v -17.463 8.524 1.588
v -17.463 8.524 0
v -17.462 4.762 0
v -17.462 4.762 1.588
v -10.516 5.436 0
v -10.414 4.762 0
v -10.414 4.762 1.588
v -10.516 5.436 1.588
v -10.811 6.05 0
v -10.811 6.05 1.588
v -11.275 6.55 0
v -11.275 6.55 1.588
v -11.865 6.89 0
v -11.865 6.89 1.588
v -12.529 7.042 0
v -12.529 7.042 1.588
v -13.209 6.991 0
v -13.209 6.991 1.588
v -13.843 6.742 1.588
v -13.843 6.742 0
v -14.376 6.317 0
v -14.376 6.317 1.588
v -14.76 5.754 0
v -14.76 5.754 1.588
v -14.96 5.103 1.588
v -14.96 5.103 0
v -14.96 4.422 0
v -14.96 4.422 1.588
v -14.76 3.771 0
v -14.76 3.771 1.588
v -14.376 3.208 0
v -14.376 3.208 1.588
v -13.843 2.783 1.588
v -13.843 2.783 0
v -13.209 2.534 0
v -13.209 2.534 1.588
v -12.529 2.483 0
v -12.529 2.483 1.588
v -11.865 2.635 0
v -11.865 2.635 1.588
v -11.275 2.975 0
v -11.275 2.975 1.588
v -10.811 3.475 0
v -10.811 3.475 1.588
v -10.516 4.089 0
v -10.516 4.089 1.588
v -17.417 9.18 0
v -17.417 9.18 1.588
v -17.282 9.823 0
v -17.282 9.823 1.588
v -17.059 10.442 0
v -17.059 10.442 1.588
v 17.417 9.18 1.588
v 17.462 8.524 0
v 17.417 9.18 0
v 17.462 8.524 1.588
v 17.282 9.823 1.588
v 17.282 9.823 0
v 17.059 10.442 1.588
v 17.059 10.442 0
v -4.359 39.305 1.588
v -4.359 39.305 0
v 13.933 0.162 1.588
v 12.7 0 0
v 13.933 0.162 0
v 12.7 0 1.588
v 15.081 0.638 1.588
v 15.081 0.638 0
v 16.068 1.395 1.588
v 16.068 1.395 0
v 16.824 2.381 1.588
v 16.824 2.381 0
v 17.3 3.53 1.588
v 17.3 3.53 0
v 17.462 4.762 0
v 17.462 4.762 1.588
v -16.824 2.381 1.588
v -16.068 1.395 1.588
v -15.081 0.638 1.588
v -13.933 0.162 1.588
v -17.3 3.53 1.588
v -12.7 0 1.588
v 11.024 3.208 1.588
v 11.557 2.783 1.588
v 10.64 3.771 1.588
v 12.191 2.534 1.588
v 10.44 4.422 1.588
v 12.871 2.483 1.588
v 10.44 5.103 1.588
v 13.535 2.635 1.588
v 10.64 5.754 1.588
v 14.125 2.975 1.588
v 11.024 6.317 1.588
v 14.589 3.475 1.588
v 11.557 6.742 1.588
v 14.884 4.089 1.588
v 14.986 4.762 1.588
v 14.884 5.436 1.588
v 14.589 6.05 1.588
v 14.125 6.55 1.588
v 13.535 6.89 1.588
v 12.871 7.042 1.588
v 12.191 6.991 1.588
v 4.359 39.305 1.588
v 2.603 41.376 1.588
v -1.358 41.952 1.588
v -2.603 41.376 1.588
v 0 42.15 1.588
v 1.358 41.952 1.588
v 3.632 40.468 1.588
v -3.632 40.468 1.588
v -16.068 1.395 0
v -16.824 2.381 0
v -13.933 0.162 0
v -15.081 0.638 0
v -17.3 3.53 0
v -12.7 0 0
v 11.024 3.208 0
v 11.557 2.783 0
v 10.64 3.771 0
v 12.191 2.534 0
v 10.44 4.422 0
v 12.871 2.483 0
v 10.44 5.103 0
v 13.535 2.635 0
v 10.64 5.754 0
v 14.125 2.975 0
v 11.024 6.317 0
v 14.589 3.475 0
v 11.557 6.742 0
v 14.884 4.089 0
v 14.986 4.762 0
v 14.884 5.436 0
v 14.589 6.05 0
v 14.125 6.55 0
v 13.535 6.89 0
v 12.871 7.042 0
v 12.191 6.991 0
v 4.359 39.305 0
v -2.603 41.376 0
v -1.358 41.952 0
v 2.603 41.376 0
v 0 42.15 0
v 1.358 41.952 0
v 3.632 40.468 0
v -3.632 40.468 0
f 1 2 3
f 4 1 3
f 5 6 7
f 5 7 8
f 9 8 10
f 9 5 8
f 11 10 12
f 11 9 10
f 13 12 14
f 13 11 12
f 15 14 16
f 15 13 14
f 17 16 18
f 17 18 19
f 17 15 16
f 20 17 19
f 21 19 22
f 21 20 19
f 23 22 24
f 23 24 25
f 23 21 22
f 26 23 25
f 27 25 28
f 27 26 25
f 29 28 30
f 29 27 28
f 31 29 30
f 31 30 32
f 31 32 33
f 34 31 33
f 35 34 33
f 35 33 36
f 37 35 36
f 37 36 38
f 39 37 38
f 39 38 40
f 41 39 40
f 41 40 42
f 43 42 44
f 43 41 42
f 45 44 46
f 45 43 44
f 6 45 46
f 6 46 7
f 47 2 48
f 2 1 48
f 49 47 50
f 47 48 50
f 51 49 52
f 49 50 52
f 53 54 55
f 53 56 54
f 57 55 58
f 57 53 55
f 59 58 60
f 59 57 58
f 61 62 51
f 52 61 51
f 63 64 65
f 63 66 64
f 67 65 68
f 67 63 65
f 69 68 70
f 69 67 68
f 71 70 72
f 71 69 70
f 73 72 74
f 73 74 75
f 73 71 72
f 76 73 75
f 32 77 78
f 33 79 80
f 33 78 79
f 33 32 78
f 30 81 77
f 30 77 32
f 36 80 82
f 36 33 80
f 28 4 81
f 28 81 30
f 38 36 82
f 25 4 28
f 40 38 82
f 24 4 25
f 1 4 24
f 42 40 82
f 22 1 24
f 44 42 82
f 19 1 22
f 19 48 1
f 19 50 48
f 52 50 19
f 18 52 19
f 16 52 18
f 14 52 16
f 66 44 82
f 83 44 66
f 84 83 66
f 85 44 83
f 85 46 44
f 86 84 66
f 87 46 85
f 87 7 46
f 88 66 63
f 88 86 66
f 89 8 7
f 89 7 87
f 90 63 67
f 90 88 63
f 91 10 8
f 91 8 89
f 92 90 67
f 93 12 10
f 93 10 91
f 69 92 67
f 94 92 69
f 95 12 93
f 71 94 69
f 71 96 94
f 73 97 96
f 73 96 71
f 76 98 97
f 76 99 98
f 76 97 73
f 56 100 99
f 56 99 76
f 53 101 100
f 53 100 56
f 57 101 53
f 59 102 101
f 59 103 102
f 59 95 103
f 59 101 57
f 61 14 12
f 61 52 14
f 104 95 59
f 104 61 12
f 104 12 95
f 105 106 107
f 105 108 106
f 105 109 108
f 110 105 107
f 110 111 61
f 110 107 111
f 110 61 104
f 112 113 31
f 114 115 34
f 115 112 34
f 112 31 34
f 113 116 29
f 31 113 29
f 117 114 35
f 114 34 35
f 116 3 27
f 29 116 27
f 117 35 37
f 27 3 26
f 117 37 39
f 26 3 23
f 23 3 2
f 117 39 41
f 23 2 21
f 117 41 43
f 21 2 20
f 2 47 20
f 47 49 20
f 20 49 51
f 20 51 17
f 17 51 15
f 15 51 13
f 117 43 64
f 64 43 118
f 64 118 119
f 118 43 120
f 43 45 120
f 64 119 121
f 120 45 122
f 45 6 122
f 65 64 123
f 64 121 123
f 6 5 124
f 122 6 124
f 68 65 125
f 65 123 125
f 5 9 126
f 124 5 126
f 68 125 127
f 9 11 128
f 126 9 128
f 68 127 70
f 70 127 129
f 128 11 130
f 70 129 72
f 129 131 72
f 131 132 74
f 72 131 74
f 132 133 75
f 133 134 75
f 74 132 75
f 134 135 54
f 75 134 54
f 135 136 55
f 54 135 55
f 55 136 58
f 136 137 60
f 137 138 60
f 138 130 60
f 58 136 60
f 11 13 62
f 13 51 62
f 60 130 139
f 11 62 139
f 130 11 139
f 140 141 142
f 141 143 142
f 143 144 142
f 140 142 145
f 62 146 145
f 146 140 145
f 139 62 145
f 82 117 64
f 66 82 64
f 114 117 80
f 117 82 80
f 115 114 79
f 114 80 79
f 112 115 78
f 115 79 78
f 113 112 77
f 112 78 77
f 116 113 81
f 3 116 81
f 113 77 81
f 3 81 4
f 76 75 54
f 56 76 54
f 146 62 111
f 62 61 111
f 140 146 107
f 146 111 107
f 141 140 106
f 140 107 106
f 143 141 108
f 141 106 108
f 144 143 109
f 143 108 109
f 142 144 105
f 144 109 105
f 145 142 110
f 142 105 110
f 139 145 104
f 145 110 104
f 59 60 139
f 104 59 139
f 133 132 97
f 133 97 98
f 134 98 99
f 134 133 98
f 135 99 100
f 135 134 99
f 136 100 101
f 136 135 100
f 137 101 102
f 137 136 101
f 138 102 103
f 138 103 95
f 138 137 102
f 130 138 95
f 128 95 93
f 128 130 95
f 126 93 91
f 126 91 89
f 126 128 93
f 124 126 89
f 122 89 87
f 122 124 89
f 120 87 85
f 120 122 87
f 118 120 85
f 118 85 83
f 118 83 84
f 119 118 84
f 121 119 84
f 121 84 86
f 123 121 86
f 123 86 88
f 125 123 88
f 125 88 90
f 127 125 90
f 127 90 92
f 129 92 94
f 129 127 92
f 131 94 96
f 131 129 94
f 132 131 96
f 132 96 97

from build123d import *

# Parameters (mm, degrees)
SKETCH1_R           = 2.286
BOSS_EXTRUDE1_DEPTH = 1.5875
FILLET1_R           = 4.7625


with BuildPart() as part:
    # Sketch1 → Boss-Extrude1 (new body)
    with BuildSketch(Plane.XY):
        Polygon((-17.4625, 0), (17.4625, 0), (17.4625, 9.525), (0, 49.2125), (-17.4625, 9.525), align=None)
        with Locations((-12.7, 4.7625)):
            Circle(SKETCH1_R, mode=Mode.SUBTRACT)
        with Locations((12.7, 4.7625)):
            Circle(SKETCH1_R, mode=Mode.SUBTRACT)
    extrude(amount=BOSS_EXTRUDE1_DEPTH)

    # Fillet1
    fillet1_edges = [part.edges().sort_by_distance(p)[0] for p in [
        (17.4625, 0, 0.79375),
        (-17.4625, 0, 0.79375),
        (-17.4625, 9.525, 0.79375),
        (0, 49.2125, 0.79375),
        (17.4625, 9.525, 0.79375),
    ]]
    fillet(fillet1_edges, radius=FILLET1_R)


solid = part.part
